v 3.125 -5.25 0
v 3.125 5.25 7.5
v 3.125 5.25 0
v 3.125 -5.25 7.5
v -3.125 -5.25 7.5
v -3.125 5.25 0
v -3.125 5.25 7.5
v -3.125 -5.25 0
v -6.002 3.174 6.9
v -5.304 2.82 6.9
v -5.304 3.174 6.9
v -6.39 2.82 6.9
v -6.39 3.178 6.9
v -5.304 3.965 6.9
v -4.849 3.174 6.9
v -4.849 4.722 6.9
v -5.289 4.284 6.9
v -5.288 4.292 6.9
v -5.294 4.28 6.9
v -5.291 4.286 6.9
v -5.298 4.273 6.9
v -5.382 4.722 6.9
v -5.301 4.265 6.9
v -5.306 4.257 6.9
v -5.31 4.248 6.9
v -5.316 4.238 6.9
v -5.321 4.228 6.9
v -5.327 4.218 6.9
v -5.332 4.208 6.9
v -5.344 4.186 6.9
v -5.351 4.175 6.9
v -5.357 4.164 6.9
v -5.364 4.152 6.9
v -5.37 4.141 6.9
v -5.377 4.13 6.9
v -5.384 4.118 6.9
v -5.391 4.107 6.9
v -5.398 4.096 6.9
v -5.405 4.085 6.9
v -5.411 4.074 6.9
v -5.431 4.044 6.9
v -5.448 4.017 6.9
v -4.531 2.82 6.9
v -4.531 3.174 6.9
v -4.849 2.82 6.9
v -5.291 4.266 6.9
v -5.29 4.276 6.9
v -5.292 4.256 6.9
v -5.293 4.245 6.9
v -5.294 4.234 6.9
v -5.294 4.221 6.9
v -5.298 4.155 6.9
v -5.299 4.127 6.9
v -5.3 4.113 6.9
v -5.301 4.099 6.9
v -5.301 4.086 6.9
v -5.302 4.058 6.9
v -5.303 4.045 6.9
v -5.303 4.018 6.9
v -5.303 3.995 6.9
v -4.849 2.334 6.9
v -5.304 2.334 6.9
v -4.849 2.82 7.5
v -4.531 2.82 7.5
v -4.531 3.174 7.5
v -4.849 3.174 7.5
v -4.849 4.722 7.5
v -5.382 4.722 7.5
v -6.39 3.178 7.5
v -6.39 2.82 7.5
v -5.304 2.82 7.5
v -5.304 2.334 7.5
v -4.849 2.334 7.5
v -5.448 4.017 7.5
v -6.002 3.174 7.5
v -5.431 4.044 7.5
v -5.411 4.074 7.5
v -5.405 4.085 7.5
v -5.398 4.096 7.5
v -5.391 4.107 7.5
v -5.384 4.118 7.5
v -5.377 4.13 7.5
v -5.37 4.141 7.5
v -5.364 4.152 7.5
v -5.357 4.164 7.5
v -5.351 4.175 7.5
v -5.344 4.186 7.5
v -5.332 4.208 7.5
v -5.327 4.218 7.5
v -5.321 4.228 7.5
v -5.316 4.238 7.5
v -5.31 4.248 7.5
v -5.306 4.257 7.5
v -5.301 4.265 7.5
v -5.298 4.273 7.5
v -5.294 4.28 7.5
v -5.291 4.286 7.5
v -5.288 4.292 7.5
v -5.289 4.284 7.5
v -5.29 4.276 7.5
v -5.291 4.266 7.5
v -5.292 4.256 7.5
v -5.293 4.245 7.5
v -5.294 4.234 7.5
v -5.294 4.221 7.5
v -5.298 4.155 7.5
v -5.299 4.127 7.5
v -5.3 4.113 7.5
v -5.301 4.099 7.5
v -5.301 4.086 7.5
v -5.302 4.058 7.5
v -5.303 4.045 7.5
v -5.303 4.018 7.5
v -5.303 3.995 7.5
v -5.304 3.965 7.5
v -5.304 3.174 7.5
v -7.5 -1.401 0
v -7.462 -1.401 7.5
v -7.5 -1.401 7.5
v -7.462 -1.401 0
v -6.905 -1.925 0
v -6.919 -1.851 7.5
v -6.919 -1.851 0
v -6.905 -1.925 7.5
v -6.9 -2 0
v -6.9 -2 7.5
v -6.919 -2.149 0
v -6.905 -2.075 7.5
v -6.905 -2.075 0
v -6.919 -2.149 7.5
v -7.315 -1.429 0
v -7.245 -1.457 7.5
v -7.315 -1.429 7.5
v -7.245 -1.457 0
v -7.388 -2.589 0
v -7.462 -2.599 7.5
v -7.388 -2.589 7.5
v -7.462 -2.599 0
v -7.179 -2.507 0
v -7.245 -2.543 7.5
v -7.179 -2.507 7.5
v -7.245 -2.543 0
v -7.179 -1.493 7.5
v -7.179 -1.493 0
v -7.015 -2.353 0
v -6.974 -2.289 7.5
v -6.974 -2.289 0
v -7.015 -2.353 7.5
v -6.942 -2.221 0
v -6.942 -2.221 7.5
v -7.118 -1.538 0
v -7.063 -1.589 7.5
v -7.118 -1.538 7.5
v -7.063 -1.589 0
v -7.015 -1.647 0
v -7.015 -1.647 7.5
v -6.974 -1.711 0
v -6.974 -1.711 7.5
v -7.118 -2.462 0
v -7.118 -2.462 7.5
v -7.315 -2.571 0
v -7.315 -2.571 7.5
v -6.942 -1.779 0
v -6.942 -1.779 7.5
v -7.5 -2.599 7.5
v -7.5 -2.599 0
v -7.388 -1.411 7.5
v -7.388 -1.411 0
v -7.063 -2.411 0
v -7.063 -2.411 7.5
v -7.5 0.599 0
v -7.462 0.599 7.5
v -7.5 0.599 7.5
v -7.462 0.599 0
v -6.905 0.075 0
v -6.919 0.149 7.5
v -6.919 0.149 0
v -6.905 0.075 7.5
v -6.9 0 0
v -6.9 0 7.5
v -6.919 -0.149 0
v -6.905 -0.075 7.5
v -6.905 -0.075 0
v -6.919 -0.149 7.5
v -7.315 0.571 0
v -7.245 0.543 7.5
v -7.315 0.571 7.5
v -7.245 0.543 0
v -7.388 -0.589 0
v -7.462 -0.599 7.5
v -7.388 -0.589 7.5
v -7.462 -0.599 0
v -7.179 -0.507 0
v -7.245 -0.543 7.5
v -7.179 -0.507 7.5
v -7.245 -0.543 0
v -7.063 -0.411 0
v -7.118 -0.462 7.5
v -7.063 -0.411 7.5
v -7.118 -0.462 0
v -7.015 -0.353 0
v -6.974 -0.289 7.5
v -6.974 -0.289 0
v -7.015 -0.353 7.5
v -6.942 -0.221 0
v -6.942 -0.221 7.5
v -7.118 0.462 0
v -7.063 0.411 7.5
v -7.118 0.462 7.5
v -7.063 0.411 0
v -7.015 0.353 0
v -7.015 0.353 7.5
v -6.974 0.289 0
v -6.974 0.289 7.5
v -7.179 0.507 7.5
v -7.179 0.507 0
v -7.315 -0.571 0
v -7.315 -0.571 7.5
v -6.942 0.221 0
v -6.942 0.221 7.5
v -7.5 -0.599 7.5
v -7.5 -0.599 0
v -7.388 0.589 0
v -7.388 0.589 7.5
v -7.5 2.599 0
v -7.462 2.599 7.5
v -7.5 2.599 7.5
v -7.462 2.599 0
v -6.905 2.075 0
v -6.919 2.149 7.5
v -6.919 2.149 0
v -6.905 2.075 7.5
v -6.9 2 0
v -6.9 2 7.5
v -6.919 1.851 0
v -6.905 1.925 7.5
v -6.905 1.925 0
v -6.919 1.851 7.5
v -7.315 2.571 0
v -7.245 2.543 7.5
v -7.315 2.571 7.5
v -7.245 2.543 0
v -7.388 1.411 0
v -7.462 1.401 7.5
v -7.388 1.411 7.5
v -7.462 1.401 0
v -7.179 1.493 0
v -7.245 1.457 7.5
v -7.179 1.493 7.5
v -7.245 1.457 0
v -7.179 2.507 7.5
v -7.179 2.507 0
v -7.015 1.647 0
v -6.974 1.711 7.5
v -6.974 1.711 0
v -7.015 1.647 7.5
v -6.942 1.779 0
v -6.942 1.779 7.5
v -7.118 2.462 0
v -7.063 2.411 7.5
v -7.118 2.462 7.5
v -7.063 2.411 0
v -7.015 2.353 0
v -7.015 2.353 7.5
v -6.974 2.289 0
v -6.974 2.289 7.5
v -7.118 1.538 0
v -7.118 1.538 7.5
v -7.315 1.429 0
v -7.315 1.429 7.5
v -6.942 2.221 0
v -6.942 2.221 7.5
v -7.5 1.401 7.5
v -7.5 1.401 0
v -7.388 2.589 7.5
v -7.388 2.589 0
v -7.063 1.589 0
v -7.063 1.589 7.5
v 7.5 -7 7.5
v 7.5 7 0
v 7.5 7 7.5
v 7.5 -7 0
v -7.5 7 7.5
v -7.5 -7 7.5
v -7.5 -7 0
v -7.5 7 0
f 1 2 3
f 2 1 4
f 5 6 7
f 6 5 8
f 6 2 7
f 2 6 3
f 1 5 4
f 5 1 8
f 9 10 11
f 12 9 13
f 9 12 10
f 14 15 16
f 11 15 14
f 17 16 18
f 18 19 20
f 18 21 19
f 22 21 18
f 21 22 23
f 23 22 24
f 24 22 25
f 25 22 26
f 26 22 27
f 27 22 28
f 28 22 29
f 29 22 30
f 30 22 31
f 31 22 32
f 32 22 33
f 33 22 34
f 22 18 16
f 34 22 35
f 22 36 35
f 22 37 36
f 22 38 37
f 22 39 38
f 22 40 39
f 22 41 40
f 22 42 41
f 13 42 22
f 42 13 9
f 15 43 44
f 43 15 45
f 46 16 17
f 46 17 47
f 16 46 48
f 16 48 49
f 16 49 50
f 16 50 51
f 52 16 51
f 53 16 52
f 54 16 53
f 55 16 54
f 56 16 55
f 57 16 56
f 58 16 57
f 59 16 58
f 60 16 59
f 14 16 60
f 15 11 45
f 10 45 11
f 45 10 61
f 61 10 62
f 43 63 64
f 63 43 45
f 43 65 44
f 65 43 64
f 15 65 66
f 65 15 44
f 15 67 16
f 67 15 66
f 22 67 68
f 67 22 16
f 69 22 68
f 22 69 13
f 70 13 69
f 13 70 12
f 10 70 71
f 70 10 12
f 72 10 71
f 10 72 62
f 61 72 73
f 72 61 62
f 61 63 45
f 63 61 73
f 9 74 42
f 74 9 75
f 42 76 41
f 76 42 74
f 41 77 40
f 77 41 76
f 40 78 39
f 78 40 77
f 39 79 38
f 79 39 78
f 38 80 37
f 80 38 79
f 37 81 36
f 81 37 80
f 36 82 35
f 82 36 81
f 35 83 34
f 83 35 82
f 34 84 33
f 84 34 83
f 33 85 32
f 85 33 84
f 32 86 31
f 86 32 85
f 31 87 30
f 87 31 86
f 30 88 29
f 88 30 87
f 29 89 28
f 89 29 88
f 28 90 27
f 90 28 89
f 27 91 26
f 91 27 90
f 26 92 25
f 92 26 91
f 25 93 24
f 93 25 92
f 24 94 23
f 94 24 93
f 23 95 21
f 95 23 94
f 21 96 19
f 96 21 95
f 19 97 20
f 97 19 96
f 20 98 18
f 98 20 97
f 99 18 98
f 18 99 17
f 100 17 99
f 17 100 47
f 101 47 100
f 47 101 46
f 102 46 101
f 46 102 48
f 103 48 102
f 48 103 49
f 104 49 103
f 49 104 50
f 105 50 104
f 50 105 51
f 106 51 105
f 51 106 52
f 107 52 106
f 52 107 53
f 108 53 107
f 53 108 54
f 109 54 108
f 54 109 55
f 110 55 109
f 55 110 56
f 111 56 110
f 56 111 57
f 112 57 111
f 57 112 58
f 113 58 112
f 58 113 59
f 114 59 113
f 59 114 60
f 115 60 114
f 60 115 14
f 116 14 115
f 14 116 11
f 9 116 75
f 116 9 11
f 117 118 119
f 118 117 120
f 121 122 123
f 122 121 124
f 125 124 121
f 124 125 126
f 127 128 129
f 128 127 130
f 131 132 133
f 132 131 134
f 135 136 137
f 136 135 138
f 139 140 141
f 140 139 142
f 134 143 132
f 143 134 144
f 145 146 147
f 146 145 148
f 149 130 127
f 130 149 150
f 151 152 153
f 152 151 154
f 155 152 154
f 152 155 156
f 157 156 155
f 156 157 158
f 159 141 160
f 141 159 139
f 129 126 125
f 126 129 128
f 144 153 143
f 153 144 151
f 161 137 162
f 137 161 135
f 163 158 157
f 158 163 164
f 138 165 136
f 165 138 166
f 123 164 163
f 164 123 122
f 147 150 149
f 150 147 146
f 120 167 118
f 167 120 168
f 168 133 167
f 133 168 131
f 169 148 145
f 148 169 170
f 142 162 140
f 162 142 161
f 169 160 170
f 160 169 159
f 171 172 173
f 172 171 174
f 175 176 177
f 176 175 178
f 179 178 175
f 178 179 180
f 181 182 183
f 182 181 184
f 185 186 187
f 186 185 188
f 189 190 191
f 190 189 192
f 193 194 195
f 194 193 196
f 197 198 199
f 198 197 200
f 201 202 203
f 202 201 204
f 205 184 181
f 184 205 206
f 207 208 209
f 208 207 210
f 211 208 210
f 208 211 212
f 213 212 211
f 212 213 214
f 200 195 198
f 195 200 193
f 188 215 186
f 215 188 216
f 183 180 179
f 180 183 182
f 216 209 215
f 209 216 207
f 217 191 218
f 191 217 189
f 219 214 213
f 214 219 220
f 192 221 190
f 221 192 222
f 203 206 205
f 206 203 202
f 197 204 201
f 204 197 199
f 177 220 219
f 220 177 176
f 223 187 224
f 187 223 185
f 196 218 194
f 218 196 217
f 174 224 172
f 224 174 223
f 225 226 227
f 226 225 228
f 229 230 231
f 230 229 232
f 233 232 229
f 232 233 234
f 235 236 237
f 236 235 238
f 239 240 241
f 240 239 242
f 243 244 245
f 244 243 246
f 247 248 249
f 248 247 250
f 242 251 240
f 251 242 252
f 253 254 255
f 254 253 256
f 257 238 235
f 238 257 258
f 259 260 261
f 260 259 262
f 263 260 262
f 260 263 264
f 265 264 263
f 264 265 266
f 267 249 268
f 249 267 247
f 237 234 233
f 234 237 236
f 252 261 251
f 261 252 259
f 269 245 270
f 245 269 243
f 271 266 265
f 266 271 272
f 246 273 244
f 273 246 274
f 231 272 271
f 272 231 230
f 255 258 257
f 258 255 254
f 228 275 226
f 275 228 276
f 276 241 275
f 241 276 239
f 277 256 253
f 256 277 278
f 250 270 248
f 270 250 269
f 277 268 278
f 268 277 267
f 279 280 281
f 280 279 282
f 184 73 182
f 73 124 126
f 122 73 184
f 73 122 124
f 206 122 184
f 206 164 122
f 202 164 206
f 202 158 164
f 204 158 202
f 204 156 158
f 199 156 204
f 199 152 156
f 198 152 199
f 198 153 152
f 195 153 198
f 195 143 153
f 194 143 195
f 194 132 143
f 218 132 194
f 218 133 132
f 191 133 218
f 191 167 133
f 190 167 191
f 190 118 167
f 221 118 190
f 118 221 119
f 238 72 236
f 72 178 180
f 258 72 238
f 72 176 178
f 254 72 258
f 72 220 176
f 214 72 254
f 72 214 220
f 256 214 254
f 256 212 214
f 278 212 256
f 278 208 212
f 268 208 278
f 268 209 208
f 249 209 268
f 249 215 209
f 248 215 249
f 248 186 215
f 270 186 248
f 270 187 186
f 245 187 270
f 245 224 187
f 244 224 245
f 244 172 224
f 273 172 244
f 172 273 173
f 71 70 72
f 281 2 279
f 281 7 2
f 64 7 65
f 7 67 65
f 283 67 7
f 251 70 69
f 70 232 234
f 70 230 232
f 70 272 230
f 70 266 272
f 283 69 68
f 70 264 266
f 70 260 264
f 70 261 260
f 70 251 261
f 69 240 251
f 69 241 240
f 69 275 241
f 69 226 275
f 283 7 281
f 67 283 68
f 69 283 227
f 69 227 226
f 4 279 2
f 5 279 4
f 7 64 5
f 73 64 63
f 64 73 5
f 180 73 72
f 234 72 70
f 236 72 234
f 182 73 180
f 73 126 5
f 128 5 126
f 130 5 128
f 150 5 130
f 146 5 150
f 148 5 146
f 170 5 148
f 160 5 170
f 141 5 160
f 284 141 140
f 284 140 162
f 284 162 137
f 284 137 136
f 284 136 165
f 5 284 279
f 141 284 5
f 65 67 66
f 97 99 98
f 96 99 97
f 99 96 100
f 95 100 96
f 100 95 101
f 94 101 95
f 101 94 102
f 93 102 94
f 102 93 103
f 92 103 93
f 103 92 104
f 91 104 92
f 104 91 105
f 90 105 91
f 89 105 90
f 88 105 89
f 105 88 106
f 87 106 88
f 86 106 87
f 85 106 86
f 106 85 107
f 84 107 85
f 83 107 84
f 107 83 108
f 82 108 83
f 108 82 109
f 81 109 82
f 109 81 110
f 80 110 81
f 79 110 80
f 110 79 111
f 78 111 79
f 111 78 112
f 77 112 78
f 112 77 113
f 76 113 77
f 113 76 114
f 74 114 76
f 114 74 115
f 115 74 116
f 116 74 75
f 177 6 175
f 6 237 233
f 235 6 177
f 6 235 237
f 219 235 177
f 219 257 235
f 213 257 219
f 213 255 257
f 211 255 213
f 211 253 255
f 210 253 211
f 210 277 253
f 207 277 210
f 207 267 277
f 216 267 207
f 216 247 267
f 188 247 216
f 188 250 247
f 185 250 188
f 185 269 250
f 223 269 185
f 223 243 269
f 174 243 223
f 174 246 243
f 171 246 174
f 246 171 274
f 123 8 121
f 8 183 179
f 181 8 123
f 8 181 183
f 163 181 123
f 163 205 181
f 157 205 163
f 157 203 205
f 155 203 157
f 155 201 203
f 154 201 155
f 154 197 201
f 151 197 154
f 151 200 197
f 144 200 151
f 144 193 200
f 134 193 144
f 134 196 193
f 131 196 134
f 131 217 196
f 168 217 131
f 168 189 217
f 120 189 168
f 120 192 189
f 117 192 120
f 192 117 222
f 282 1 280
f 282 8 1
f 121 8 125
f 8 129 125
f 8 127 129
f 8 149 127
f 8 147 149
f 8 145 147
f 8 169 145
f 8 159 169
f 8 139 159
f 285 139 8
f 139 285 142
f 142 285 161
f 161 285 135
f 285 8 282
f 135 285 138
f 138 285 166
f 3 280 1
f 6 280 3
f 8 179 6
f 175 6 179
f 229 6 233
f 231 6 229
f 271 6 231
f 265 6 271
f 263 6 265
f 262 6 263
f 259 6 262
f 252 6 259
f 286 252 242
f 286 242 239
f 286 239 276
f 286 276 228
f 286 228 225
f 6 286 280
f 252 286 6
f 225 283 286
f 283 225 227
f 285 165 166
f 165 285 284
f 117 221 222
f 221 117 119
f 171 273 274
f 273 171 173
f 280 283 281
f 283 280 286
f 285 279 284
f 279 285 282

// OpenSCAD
$fn = 50;

difference() {
	union() {
		translate(v = [0, -5, 0]) {
			rotate(a = [0, 0, 0]) {
				difference() {
					union() {
						translate(v = [-7.5, -2.0, 0]) {
							cube(size = [15.0, 14.0, 7.5]);
						}
					}
					union() {
						translate(v = [-3.125, -0.25, -0.1]) {
							cube(size = [6.25, 10.5, 7.7]);
						}
						translate(v = [-5.5, 8.5, 6.9]) {
							linear_extrude(height = 0.7) {
								text(font = "Arial:style=Bold", halign = "center", size = 2.5, text = "4", valign = "center");
							}
						}
						translate(v = [-7.5, 3, -0.1]) {
							cylinder(h = 7.7, r = 0.6);
						}
						translate(v = [-7.5, 5, -0.1]) {
							cylinder(h = 7.7, r = 0.6);
						}
						translate(v = [-7.5, 7, -0.1]) {
							cylinder(h = 7.7, r = 0.6);
						}
					}
				}
			}
		}
	}
	union();
}
